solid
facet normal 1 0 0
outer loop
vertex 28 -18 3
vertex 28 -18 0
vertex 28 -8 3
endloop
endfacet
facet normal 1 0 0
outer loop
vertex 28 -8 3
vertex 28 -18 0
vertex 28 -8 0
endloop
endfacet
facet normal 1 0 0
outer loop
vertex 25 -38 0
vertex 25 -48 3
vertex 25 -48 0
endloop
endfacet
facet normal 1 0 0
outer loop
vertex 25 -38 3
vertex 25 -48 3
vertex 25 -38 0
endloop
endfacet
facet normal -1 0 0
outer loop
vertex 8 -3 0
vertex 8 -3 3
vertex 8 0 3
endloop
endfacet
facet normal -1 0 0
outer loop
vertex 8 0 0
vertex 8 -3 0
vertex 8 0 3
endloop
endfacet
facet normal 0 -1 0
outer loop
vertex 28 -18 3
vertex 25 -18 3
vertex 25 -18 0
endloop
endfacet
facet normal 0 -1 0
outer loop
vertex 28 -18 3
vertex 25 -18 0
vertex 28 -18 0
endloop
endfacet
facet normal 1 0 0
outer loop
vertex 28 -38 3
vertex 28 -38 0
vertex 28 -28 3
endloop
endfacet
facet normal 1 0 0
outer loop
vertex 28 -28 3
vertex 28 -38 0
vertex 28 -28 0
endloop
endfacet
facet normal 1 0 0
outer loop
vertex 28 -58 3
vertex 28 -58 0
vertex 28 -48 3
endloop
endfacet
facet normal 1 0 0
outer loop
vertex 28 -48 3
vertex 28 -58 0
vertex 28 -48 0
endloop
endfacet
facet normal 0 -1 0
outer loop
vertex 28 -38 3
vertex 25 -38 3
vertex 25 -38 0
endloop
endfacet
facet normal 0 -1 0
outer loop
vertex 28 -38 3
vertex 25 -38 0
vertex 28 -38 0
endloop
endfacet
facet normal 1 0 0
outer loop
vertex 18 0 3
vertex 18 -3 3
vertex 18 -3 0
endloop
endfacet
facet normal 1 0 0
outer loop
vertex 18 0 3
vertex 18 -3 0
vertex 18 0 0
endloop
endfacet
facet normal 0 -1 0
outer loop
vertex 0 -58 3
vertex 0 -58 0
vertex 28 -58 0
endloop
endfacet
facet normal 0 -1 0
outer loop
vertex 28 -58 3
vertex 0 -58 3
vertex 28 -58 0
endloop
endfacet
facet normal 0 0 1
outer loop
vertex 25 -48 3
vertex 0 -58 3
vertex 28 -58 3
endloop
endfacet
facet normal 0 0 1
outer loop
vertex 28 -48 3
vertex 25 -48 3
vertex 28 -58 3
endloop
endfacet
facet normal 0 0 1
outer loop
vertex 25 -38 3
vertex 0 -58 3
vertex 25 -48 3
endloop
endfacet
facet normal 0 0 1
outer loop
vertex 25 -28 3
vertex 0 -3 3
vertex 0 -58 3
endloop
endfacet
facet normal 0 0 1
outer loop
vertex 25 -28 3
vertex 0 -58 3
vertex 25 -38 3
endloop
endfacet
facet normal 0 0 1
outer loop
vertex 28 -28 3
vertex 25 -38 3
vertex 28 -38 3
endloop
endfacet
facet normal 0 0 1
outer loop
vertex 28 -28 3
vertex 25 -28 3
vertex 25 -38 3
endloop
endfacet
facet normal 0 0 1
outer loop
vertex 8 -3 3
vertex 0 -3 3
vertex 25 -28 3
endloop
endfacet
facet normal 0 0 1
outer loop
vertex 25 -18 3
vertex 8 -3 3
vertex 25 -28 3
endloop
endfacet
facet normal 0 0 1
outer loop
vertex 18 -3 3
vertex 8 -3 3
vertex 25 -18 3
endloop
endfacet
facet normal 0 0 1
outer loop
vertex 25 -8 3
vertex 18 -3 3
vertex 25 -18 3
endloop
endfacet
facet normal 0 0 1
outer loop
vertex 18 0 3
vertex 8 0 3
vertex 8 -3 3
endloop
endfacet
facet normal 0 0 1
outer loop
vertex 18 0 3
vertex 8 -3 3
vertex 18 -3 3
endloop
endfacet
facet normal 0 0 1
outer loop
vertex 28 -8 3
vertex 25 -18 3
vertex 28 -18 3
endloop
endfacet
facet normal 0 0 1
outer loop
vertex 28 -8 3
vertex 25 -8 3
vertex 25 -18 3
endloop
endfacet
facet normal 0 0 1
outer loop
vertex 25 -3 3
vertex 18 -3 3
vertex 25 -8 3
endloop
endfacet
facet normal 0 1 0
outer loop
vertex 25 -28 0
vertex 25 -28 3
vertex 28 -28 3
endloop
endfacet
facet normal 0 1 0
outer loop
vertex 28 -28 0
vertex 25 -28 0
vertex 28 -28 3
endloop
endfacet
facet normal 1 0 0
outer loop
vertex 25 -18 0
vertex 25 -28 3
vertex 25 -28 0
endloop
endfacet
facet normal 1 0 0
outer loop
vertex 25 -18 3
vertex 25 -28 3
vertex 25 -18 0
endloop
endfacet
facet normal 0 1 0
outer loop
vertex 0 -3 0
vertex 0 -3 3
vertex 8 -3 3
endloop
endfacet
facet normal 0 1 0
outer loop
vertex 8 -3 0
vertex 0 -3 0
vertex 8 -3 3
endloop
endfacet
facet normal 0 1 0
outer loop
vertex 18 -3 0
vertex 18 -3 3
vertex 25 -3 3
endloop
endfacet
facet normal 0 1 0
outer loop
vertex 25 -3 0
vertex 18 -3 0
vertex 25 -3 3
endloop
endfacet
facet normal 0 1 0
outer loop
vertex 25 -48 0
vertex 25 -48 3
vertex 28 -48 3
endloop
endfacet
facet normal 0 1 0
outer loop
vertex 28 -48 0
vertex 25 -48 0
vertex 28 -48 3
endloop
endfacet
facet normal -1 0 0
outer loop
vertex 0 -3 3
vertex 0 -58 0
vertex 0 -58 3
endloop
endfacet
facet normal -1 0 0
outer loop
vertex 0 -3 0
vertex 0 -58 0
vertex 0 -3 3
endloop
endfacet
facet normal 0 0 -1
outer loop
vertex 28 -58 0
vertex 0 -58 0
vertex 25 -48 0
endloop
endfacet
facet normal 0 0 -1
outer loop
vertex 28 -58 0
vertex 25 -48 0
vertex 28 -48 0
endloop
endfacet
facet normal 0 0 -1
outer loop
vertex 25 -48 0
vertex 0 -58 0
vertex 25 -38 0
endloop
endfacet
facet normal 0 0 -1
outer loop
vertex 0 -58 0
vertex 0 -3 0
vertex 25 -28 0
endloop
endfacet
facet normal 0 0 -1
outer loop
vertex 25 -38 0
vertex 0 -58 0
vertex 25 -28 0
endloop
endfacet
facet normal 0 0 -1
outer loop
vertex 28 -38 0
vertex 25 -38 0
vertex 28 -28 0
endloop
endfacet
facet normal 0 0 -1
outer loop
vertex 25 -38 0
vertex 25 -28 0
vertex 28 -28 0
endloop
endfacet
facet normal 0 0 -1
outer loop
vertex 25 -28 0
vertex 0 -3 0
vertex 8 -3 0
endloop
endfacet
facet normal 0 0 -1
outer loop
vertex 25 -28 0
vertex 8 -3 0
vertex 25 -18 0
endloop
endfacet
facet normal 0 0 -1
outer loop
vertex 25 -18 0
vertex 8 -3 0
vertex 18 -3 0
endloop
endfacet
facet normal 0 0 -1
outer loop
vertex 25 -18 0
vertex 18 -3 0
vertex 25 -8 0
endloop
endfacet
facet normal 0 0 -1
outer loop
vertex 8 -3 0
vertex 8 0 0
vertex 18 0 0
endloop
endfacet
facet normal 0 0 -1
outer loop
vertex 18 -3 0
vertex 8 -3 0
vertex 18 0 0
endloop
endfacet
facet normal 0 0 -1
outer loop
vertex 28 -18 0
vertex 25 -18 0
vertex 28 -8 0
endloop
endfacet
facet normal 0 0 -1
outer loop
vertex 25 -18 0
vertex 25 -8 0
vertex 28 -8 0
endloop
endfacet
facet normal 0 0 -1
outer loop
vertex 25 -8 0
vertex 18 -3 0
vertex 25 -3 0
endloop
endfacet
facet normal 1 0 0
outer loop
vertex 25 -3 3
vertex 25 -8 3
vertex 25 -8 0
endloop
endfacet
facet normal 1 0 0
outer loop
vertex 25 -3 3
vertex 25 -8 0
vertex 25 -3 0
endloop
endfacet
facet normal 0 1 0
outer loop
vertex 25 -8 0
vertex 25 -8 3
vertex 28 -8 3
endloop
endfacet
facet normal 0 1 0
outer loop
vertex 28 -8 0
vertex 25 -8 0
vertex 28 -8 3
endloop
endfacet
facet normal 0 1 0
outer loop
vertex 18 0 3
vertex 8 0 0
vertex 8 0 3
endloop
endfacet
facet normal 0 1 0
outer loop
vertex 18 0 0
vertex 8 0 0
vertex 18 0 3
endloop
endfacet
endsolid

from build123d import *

# Parameters (mm, degrees)
ESQUISSE1_W                = 28
ESQUISSE1_H                = 58
BOSS_EXTRU_1_DEPTH         = 3
ESQUISSE2_W                = 10
ESQUISSE2_H                = 3
ENL_V_MAT_EXTRU_1_DEPTH    = 3
R_P_TITION_LIN_AIRE1_COUNT = 2
R_P_TITION_LIN_AIRE1_PITCH = 20
ESQUISSE3_W                = 3
ESQUISSE3_H                = 10
ENL_V_MAT_EXTRU_2_DEPTH    = 3
R_P_TITION_LIN_AIRE2_COUNT = 3
R_P_TITION_LIN_AIRE2_PITCH = 20


with BuildPart() as part:
    # Esquisse1 → Boss.-Extru.1 (new body)
    with BuildSketch(Plane.XY):
        with Locations((14, -29)):
            Rectangle(ESQUISSE1_W, ESQUISSE1_H)
    extrude(amount=BOSS_EXTRU_1_DEPTH)

    # Esquisse2 → Enlèv. mat.-Extru.1 (cut)
    with BuildSketch(Plane.XY.offset(3)):
        with Locations((23, -1.5)):
            Rectangle(ESQUISSE2_W, ESQUISSE2_H)
    enl_v_mat_extru_1 = extrude(amount=-ENL_V_MAT_EXTRU_1_DEPTH, mode=Mode.SUBTRACT)

    # Répétition linéaire1: Enlèv. mat.-Extru.1 ×2
    with Locations(*[(-i * R_P_TITION_LIN_AIRE1_PITCH, 0, 0) for i in range(1, R_P_TITION_LIN_AIRE1_COUNT)]):
        add(enl_v_mat_extru_1, mode=Mode.SUBTRACT)

    # Esquisse3 → Enlèv. mat.-Extru.2 (cut)
    with BuildSketch(Plane.XY.offset(3)):
        with Locations((26.5, -43)):
            Rectangle(ESQUISSE3_W, ESQUISSE3_H)
    enl_v_mat_extru_2 = extrude(amount=-ENL_V_MAT_EXTRU_2_DEPTH, mode=Mode.SUBTRACT)

    # Répétition linéaire2: Enlèv. mat.-Extru.2 ×3
    with Locations(*[(0, i * R_P_TITION_LIN_AIRE2_PITCH, 0) for i in range(1, R_P_TITION_LIN_AIRE2_COUNT)]):
        add(enl_v_mat_extru_2, mode=Mode.SUBTRACT)


solid = part.part
